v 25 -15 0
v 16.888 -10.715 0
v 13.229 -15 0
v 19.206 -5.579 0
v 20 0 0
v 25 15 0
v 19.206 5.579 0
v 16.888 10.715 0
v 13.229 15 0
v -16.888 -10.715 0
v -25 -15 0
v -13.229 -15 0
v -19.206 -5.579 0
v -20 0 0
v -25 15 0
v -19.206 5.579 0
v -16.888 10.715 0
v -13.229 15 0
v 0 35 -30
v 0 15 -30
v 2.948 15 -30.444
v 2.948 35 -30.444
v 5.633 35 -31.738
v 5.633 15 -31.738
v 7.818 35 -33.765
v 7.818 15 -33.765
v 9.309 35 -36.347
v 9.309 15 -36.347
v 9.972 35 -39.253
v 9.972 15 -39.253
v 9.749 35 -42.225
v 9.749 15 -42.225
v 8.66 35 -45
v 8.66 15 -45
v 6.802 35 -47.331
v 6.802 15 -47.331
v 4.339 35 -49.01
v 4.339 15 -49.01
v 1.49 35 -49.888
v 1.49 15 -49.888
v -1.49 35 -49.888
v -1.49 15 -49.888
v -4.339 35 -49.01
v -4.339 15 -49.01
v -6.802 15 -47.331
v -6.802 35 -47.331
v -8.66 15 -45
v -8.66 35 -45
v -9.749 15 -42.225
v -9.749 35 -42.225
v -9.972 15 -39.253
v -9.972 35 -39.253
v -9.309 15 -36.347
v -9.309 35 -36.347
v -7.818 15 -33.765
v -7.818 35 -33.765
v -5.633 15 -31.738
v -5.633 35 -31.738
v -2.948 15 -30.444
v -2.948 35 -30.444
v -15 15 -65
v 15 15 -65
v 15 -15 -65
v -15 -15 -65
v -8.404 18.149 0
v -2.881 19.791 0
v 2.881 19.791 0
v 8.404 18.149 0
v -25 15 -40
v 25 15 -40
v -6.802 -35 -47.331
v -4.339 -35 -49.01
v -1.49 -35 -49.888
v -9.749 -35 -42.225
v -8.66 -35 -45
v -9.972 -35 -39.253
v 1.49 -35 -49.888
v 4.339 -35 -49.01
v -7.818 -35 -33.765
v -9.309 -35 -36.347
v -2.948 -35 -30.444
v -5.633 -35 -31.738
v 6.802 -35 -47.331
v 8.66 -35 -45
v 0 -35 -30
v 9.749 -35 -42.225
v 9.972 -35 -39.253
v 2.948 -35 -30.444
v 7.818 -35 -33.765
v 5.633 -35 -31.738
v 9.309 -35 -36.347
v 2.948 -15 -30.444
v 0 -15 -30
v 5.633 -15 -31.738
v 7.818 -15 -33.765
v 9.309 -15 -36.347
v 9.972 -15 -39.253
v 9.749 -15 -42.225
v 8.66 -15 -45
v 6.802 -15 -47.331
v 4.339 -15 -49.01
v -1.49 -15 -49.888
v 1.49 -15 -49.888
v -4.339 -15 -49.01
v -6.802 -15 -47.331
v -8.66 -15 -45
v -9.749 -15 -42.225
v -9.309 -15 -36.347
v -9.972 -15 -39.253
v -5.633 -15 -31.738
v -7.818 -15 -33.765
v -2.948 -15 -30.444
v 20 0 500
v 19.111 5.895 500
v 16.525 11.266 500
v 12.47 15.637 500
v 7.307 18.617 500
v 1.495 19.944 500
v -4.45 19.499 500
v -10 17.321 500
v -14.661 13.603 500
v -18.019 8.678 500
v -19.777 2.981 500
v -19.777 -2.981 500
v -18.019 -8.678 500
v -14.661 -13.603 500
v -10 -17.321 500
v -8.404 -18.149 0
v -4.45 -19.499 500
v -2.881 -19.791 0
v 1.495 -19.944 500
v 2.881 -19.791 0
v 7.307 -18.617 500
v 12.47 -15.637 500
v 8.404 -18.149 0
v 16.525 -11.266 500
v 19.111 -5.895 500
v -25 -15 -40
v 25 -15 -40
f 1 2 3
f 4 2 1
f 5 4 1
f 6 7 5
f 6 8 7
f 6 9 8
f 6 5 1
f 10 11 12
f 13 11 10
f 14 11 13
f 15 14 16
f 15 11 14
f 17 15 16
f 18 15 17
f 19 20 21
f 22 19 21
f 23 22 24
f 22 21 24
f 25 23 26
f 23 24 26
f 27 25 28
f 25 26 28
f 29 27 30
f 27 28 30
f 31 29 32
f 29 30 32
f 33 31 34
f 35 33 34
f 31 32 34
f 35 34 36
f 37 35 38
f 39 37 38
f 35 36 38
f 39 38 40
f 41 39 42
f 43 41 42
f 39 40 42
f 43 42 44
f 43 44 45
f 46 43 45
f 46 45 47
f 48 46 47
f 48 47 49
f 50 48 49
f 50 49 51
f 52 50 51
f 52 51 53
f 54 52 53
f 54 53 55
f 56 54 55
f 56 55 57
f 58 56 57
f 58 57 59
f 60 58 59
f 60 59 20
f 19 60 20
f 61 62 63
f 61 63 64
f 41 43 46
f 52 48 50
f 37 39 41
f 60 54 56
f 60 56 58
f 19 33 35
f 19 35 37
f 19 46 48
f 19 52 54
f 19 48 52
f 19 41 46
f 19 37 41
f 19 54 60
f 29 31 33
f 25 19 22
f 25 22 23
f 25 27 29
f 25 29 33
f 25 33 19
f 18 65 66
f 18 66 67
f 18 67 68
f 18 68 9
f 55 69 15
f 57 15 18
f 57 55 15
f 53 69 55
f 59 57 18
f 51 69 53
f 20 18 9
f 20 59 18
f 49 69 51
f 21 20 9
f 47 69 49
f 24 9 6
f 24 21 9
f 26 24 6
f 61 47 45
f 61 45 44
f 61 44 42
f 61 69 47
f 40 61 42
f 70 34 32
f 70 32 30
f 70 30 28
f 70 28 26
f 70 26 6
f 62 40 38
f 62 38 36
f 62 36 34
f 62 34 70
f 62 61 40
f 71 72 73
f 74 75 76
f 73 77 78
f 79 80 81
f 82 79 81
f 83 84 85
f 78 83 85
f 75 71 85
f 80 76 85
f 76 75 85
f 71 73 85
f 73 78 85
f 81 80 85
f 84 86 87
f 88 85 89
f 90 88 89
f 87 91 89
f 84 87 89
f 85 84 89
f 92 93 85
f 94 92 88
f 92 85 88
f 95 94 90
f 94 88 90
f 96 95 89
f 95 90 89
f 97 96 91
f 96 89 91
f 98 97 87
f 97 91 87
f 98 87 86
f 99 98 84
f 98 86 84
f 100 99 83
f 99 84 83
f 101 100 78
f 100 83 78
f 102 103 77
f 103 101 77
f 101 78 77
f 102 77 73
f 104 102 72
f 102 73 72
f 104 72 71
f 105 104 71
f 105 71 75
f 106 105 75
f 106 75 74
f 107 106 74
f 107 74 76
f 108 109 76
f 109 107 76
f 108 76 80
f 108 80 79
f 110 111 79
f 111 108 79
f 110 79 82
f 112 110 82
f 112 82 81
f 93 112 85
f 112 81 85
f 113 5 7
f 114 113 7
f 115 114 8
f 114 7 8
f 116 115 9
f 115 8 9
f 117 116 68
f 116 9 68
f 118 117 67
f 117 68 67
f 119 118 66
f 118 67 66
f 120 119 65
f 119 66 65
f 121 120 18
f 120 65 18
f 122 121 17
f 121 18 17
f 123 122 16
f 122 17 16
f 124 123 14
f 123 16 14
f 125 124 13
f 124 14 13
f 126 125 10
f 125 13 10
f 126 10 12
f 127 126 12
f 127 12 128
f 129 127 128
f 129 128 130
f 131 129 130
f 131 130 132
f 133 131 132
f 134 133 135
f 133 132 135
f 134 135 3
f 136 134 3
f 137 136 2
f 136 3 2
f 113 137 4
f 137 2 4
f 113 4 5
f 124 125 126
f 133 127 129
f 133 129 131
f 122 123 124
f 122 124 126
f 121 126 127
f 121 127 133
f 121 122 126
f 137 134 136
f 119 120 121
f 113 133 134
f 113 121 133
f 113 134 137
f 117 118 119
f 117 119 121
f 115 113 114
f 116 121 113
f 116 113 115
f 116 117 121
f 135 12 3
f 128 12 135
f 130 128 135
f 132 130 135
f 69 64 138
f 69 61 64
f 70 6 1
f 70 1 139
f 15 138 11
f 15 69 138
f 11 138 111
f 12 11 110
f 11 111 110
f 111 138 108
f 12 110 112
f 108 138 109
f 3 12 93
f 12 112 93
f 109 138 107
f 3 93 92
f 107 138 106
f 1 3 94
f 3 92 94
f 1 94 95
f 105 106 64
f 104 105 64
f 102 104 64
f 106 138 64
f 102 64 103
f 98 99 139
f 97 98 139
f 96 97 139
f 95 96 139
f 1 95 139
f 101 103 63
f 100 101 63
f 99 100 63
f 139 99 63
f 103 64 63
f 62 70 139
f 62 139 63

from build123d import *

# Parameters (mm, degrees)
SKETCH1_R                = 20
BOSS_EXTRUDE1_DEPTH      = 500
BOSS_EXTRUDE2_DEPTH      = 15
BOSS_EXTRUDE3_DEPTH      = 35
BOSS_EXTRUDE3_DEPTH_BACK = 35
SKETCH3_R                = 10


with BuildPart() as part:
    # Sketch1 → Boss-Extrude1 (new body)
    with BuildSketch(Plane.XY):
        Circle(SKETCH1_R)
    extrude(amount=BOSS_EXTRUDE1_DEPTH)

    # Sketch2 → Boss-Extrude2 (add, symmetric)
    with BuildSketch(Plane(origin=(0, 0, 0), x_dir=(1, 0, 0), z_dir=(0, 1, 0))):
        Polygon((-25, 0), (25, 0), (25, 40), (15, 65), (-15, 65), (-25, 40), align=None)
    extrude(amount=BOSS_EXTRUDE2_DEPTH, both=True)

    # Sketch3 → Boss-Extrude3 (add, two sides: drawn at the far end of the back side and taken through both)
    with BuildSketch(Plane(origin=(0, 0, 0), x_dir=(1, 0, 0), z_dir=(0, 1, 0)).offset(-BOSS_EXTRUDE3_DEPTH_BACK)):
        with Locations(Location((0, 40, 0), (0, 0, 270))):
            Circle(SKETCH3_R)
    extrude(amount=BOSS_EXTRUDE3_DEPTH + BOSS_EXTRUDE3_DEPTH_BACK)


solid = part.part
